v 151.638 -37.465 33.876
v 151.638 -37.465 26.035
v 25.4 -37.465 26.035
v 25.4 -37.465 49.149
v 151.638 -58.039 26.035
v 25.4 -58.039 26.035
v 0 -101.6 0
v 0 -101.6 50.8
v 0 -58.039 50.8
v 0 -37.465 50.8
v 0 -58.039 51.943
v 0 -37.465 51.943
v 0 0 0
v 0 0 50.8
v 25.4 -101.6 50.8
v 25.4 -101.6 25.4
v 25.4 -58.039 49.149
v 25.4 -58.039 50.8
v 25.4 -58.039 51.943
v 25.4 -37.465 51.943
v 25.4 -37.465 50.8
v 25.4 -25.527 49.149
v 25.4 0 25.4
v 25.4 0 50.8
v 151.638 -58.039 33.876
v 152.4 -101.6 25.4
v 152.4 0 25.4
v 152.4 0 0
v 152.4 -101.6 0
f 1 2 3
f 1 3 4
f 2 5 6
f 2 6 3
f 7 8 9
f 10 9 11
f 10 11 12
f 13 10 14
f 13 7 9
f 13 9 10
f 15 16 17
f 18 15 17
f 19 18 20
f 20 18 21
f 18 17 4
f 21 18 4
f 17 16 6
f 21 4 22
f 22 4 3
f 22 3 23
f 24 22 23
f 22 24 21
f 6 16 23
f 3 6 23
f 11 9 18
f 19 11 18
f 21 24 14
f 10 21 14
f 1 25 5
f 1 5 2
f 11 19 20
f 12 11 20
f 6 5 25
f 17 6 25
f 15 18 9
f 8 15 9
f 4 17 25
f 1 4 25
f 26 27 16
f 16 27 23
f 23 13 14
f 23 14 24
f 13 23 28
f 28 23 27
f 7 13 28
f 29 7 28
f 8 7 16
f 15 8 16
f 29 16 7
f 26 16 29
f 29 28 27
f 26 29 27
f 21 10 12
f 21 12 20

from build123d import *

# Parameters (mm, degrees)
F1_DEPTH = 101.6
F2_W     = 20.5739997327
F2_H     = 25.399999693
F3_DEPTH = 151.638
F4_DEPTH = 2.286
F6_DEPTH = 32.512
F7_DEPTH = 2.794


with BuildPart() as f1:
    # F0 (on Front) → F1 (new body)
    with BuildSketch(Plane.XZ):
        Polygon((0, 50.8), (0, 0), (152.4, 0), (152.4, 25.4), (25.4, 25.4), (25.4, 50.8), align=None)
    extrude(amount=F1_DEPTH)

    # F2 (on Right) → F3 (join)
    with BuildSketch(Plane.YZ):
        with Locations((-47.7519985288, 38.735001348)):
            Rectangle(F2_W, F2_H)
    extrude(amount=F3_DEPTH)

    # F4 (cut): a face of the model
    f4_faces = [f1.faces().sort_by_distance(p)[0] for p in [
        (75.819, -47.7519985288, 51.4350011945),
    ]]
    extrude(f4_faces, amount=-F4_DEPTH, mode=Mode.SUBTRACT)

    # F5 (on face) → F6 (cut)
    with BuildSketch(Plane.XZ.offset(58.0389983952)):
        Polygon((151.638, 49.1490011945), (25.4, 49.1490011945), (151.638, 33.8758528233), align=None)
    extrude(amount=-F6_DEPTH, mode=Mode.SUBTRACT)

    # F7 (add): a face of the model
    f7_faces = [f1.faces().sort_by_distance(p)[0] for p in [
        (12.7, -47.7519985288, 49.1490011945),
    ]]
    extrude(f7_faces, amount=F7_DEPTH)


solid = f1.part
